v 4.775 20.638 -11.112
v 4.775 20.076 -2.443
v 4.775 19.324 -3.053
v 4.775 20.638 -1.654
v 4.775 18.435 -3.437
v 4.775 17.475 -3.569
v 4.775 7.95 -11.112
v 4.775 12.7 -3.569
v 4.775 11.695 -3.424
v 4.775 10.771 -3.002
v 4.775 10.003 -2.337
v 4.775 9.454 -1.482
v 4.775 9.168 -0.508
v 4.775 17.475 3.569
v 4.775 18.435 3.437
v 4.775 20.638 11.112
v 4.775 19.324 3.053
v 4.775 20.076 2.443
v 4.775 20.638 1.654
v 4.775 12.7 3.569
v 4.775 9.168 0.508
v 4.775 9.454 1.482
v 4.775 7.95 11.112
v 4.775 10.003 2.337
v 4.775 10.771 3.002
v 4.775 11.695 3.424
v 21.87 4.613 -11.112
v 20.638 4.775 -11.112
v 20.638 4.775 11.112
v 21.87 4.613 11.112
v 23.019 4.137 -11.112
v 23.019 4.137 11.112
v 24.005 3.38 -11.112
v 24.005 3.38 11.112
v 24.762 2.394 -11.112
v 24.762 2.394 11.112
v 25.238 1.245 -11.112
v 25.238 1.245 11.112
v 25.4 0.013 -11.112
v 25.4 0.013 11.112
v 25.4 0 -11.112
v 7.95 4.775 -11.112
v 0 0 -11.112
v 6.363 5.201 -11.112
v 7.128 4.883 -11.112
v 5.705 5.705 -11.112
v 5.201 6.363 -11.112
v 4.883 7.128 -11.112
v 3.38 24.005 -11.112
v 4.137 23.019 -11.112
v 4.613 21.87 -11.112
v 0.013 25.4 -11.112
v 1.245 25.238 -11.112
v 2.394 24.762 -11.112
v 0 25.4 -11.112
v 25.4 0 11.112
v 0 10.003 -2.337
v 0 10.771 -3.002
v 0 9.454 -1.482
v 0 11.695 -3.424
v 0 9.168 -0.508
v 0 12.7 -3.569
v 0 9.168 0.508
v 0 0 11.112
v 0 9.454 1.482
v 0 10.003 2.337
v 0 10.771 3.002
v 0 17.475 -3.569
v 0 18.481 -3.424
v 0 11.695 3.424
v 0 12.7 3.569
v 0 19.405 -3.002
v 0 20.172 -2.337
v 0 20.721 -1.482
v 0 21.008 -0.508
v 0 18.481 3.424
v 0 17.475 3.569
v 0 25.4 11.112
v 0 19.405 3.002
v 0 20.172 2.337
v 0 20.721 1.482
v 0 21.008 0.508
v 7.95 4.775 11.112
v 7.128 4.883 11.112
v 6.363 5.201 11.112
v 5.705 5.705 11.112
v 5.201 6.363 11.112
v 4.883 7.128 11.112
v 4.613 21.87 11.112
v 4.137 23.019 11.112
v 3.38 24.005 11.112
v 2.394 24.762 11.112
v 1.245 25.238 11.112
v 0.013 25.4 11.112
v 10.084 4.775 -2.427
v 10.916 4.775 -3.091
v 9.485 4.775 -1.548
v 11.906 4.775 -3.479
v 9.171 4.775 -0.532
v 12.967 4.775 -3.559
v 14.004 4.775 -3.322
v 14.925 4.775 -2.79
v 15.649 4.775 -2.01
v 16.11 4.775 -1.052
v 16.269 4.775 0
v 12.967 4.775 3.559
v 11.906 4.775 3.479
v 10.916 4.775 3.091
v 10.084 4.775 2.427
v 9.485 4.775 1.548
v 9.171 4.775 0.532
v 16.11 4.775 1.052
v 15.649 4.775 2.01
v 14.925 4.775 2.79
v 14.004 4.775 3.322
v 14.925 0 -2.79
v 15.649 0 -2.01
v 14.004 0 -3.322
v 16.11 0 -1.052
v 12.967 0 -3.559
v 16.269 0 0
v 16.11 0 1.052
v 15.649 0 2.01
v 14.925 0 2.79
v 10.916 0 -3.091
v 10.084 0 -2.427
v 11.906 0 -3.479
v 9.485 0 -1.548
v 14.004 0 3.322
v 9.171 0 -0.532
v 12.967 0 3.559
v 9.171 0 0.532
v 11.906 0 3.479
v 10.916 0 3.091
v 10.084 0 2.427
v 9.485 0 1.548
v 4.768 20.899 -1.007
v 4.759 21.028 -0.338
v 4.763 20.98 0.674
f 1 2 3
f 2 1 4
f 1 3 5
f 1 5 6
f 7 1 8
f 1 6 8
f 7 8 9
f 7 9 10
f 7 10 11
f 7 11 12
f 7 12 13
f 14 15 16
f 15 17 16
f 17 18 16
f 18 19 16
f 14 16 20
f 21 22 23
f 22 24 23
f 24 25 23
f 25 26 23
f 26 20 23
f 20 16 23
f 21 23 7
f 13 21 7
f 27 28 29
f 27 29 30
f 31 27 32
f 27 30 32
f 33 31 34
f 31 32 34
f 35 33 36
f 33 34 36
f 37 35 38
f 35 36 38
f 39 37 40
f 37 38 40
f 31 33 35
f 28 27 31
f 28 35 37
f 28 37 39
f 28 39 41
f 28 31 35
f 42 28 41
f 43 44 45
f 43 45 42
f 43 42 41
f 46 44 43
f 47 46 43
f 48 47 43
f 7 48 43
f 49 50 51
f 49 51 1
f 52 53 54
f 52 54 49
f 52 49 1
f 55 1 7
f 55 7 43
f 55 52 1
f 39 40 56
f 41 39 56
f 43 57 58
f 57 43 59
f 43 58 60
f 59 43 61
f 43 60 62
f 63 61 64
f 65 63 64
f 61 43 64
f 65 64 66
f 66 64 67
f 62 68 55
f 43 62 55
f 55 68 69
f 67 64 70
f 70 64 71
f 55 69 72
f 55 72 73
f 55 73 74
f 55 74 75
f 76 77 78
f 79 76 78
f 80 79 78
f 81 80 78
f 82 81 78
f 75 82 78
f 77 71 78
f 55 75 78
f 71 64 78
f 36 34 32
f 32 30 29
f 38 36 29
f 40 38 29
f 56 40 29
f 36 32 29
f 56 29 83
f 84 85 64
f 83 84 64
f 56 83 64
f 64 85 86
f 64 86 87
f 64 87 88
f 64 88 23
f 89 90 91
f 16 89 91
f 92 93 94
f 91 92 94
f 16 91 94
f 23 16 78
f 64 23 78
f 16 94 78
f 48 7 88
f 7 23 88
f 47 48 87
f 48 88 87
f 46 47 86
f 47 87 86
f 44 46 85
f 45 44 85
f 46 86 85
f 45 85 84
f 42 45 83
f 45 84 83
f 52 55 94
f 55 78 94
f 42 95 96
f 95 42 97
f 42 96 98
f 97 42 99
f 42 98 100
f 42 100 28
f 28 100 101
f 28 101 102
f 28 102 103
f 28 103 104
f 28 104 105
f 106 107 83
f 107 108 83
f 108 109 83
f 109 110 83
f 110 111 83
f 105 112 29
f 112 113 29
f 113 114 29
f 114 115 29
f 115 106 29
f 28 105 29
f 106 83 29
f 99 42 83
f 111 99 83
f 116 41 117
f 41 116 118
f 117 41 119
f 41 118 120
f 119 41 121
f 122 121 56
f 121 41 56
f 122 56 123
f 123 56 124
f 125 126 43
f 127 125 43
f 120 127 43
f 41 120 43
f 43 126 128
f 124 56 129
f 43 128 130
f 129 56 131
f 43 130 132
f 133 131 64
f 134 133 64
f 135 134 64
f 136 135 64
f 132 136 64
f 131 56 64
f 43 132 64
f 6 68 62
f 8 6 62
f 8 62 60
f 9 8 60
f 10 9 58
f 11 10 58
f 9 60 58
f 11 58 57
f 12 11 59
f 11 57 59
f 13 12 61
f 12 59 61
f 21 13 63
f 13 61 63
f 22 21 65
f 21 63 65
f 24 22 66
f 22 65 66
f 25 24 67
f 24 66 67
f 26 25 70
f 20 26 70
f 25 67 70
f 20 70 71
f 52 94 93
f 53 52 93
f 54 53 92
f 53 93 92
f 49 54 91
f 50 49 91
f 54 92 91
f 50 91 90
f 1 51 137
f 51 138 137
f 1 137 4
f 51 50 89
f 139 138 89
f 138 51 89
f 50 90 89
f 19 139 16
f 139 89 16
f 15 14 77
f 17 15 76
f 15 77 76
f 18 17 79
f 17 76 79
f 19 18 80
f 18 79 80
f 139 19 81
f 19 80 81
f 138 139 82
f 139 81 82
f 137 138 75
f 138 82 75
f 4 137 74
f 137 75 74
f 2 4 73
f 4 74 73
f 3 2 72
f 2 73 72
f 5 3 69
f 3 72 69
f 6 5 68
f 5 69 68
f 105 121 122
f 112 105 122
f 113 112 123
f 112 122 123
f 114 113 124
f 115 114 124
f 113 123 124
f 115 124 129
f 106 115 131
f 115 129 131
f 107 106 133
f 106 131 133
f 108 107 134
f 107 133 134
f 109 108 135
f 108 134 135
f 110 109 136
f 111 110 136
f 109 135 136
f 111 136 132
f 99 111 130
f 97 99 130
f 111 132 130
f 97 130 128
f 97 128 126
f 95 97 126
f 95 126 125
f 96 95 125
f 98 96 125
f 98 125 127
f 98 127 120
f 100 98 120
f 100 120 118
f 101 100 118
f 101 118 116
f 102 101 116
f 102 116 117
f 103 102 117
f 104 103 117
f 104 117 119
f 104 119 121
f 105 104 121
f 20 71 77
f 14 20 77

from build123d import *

# Parameters (mm, degrees)
BOSS_EXTRUDE1_DEPTH = 11.1125
CUT_EXTRUDE1_REACH  = 39.601
SKETCH4_R           = 3.5687
CUT_EXTRUDE2_DEPTH  = 38.600633818


with BuildPart() as part:
    # Sketch2 → Boss-Extrude1 (new, symmetric)
    with BuildSketch(Plane.XY):
        with BuildLine():
            Line((0, 0), (0, 25.4))
            Line((0, 25.4), (0.0127, 25.4))
            ThreePointArc((0.0127, 25.4), (3.380296045, 24.005096045), (4.7752, 20.6375))
            Line((4.7752, 20.6375), (4.7752, 7.9502))
            ThreePointArc((4.7752, 7.9502), (5.70513597, 5.70513597), (7.9502, 4.7752))
            Line((7.9502, 4.7752), (20.6375, 4.7752))
            ThreePointArc((20.6375, 4.7752), (24.005096045, 3.380296045), (25.4, 0.0127))
            Line((25.4, 0.0127), (25.4, 0))
            Line((25.4, 0), (0, 0))
        make_face()
    extrude(amount=BOSS_EXTRUDE1_DEPTH, both=True)

    # Sketch3 → Cut-Extrude1 (cut, up to next)
    with BuildSketch(Plane.ZY, mode=Mode.PRIVATE) as cut_extrude1_sk1:
        with BuildLine():
            Line((-3.5687, 17.4752), (-3.5687, 12.7))
            ThreePointArc((-3.5687, 12.7), (0, 9.1313), (3.5687, 12.7))
            Line((3.5687, 12.7), (3.5687, 17.4752))
            ThreePointArc((3.5687, 17.4752), (0, 21.0439), (-3.5687, 17.4752))
        make_face()
    cut_extrude1_tool1 = extrude(cut_extrude1_sk1.sketch, amount=-CUT_EXTRUDE1_REACH, mode=Mode.PRIVATE) & part.part
    add(cut_extrude1_tool1.solids().sort_by_distance((0, 15.0876, 0))[0], mode=Mode.SUBTRACT)

    # Sketch4 → Cut-Extrude2 (cut, through all)
    with BuildSketch(Plane.XZ):
        with Locations((12.7, 0)):
            Circle(SKETCH4_R)
    extrude(amount=-CUT_EXTRUDE2_DEPTH, mode=Mode.SUBTRACT)


solid = part.part
